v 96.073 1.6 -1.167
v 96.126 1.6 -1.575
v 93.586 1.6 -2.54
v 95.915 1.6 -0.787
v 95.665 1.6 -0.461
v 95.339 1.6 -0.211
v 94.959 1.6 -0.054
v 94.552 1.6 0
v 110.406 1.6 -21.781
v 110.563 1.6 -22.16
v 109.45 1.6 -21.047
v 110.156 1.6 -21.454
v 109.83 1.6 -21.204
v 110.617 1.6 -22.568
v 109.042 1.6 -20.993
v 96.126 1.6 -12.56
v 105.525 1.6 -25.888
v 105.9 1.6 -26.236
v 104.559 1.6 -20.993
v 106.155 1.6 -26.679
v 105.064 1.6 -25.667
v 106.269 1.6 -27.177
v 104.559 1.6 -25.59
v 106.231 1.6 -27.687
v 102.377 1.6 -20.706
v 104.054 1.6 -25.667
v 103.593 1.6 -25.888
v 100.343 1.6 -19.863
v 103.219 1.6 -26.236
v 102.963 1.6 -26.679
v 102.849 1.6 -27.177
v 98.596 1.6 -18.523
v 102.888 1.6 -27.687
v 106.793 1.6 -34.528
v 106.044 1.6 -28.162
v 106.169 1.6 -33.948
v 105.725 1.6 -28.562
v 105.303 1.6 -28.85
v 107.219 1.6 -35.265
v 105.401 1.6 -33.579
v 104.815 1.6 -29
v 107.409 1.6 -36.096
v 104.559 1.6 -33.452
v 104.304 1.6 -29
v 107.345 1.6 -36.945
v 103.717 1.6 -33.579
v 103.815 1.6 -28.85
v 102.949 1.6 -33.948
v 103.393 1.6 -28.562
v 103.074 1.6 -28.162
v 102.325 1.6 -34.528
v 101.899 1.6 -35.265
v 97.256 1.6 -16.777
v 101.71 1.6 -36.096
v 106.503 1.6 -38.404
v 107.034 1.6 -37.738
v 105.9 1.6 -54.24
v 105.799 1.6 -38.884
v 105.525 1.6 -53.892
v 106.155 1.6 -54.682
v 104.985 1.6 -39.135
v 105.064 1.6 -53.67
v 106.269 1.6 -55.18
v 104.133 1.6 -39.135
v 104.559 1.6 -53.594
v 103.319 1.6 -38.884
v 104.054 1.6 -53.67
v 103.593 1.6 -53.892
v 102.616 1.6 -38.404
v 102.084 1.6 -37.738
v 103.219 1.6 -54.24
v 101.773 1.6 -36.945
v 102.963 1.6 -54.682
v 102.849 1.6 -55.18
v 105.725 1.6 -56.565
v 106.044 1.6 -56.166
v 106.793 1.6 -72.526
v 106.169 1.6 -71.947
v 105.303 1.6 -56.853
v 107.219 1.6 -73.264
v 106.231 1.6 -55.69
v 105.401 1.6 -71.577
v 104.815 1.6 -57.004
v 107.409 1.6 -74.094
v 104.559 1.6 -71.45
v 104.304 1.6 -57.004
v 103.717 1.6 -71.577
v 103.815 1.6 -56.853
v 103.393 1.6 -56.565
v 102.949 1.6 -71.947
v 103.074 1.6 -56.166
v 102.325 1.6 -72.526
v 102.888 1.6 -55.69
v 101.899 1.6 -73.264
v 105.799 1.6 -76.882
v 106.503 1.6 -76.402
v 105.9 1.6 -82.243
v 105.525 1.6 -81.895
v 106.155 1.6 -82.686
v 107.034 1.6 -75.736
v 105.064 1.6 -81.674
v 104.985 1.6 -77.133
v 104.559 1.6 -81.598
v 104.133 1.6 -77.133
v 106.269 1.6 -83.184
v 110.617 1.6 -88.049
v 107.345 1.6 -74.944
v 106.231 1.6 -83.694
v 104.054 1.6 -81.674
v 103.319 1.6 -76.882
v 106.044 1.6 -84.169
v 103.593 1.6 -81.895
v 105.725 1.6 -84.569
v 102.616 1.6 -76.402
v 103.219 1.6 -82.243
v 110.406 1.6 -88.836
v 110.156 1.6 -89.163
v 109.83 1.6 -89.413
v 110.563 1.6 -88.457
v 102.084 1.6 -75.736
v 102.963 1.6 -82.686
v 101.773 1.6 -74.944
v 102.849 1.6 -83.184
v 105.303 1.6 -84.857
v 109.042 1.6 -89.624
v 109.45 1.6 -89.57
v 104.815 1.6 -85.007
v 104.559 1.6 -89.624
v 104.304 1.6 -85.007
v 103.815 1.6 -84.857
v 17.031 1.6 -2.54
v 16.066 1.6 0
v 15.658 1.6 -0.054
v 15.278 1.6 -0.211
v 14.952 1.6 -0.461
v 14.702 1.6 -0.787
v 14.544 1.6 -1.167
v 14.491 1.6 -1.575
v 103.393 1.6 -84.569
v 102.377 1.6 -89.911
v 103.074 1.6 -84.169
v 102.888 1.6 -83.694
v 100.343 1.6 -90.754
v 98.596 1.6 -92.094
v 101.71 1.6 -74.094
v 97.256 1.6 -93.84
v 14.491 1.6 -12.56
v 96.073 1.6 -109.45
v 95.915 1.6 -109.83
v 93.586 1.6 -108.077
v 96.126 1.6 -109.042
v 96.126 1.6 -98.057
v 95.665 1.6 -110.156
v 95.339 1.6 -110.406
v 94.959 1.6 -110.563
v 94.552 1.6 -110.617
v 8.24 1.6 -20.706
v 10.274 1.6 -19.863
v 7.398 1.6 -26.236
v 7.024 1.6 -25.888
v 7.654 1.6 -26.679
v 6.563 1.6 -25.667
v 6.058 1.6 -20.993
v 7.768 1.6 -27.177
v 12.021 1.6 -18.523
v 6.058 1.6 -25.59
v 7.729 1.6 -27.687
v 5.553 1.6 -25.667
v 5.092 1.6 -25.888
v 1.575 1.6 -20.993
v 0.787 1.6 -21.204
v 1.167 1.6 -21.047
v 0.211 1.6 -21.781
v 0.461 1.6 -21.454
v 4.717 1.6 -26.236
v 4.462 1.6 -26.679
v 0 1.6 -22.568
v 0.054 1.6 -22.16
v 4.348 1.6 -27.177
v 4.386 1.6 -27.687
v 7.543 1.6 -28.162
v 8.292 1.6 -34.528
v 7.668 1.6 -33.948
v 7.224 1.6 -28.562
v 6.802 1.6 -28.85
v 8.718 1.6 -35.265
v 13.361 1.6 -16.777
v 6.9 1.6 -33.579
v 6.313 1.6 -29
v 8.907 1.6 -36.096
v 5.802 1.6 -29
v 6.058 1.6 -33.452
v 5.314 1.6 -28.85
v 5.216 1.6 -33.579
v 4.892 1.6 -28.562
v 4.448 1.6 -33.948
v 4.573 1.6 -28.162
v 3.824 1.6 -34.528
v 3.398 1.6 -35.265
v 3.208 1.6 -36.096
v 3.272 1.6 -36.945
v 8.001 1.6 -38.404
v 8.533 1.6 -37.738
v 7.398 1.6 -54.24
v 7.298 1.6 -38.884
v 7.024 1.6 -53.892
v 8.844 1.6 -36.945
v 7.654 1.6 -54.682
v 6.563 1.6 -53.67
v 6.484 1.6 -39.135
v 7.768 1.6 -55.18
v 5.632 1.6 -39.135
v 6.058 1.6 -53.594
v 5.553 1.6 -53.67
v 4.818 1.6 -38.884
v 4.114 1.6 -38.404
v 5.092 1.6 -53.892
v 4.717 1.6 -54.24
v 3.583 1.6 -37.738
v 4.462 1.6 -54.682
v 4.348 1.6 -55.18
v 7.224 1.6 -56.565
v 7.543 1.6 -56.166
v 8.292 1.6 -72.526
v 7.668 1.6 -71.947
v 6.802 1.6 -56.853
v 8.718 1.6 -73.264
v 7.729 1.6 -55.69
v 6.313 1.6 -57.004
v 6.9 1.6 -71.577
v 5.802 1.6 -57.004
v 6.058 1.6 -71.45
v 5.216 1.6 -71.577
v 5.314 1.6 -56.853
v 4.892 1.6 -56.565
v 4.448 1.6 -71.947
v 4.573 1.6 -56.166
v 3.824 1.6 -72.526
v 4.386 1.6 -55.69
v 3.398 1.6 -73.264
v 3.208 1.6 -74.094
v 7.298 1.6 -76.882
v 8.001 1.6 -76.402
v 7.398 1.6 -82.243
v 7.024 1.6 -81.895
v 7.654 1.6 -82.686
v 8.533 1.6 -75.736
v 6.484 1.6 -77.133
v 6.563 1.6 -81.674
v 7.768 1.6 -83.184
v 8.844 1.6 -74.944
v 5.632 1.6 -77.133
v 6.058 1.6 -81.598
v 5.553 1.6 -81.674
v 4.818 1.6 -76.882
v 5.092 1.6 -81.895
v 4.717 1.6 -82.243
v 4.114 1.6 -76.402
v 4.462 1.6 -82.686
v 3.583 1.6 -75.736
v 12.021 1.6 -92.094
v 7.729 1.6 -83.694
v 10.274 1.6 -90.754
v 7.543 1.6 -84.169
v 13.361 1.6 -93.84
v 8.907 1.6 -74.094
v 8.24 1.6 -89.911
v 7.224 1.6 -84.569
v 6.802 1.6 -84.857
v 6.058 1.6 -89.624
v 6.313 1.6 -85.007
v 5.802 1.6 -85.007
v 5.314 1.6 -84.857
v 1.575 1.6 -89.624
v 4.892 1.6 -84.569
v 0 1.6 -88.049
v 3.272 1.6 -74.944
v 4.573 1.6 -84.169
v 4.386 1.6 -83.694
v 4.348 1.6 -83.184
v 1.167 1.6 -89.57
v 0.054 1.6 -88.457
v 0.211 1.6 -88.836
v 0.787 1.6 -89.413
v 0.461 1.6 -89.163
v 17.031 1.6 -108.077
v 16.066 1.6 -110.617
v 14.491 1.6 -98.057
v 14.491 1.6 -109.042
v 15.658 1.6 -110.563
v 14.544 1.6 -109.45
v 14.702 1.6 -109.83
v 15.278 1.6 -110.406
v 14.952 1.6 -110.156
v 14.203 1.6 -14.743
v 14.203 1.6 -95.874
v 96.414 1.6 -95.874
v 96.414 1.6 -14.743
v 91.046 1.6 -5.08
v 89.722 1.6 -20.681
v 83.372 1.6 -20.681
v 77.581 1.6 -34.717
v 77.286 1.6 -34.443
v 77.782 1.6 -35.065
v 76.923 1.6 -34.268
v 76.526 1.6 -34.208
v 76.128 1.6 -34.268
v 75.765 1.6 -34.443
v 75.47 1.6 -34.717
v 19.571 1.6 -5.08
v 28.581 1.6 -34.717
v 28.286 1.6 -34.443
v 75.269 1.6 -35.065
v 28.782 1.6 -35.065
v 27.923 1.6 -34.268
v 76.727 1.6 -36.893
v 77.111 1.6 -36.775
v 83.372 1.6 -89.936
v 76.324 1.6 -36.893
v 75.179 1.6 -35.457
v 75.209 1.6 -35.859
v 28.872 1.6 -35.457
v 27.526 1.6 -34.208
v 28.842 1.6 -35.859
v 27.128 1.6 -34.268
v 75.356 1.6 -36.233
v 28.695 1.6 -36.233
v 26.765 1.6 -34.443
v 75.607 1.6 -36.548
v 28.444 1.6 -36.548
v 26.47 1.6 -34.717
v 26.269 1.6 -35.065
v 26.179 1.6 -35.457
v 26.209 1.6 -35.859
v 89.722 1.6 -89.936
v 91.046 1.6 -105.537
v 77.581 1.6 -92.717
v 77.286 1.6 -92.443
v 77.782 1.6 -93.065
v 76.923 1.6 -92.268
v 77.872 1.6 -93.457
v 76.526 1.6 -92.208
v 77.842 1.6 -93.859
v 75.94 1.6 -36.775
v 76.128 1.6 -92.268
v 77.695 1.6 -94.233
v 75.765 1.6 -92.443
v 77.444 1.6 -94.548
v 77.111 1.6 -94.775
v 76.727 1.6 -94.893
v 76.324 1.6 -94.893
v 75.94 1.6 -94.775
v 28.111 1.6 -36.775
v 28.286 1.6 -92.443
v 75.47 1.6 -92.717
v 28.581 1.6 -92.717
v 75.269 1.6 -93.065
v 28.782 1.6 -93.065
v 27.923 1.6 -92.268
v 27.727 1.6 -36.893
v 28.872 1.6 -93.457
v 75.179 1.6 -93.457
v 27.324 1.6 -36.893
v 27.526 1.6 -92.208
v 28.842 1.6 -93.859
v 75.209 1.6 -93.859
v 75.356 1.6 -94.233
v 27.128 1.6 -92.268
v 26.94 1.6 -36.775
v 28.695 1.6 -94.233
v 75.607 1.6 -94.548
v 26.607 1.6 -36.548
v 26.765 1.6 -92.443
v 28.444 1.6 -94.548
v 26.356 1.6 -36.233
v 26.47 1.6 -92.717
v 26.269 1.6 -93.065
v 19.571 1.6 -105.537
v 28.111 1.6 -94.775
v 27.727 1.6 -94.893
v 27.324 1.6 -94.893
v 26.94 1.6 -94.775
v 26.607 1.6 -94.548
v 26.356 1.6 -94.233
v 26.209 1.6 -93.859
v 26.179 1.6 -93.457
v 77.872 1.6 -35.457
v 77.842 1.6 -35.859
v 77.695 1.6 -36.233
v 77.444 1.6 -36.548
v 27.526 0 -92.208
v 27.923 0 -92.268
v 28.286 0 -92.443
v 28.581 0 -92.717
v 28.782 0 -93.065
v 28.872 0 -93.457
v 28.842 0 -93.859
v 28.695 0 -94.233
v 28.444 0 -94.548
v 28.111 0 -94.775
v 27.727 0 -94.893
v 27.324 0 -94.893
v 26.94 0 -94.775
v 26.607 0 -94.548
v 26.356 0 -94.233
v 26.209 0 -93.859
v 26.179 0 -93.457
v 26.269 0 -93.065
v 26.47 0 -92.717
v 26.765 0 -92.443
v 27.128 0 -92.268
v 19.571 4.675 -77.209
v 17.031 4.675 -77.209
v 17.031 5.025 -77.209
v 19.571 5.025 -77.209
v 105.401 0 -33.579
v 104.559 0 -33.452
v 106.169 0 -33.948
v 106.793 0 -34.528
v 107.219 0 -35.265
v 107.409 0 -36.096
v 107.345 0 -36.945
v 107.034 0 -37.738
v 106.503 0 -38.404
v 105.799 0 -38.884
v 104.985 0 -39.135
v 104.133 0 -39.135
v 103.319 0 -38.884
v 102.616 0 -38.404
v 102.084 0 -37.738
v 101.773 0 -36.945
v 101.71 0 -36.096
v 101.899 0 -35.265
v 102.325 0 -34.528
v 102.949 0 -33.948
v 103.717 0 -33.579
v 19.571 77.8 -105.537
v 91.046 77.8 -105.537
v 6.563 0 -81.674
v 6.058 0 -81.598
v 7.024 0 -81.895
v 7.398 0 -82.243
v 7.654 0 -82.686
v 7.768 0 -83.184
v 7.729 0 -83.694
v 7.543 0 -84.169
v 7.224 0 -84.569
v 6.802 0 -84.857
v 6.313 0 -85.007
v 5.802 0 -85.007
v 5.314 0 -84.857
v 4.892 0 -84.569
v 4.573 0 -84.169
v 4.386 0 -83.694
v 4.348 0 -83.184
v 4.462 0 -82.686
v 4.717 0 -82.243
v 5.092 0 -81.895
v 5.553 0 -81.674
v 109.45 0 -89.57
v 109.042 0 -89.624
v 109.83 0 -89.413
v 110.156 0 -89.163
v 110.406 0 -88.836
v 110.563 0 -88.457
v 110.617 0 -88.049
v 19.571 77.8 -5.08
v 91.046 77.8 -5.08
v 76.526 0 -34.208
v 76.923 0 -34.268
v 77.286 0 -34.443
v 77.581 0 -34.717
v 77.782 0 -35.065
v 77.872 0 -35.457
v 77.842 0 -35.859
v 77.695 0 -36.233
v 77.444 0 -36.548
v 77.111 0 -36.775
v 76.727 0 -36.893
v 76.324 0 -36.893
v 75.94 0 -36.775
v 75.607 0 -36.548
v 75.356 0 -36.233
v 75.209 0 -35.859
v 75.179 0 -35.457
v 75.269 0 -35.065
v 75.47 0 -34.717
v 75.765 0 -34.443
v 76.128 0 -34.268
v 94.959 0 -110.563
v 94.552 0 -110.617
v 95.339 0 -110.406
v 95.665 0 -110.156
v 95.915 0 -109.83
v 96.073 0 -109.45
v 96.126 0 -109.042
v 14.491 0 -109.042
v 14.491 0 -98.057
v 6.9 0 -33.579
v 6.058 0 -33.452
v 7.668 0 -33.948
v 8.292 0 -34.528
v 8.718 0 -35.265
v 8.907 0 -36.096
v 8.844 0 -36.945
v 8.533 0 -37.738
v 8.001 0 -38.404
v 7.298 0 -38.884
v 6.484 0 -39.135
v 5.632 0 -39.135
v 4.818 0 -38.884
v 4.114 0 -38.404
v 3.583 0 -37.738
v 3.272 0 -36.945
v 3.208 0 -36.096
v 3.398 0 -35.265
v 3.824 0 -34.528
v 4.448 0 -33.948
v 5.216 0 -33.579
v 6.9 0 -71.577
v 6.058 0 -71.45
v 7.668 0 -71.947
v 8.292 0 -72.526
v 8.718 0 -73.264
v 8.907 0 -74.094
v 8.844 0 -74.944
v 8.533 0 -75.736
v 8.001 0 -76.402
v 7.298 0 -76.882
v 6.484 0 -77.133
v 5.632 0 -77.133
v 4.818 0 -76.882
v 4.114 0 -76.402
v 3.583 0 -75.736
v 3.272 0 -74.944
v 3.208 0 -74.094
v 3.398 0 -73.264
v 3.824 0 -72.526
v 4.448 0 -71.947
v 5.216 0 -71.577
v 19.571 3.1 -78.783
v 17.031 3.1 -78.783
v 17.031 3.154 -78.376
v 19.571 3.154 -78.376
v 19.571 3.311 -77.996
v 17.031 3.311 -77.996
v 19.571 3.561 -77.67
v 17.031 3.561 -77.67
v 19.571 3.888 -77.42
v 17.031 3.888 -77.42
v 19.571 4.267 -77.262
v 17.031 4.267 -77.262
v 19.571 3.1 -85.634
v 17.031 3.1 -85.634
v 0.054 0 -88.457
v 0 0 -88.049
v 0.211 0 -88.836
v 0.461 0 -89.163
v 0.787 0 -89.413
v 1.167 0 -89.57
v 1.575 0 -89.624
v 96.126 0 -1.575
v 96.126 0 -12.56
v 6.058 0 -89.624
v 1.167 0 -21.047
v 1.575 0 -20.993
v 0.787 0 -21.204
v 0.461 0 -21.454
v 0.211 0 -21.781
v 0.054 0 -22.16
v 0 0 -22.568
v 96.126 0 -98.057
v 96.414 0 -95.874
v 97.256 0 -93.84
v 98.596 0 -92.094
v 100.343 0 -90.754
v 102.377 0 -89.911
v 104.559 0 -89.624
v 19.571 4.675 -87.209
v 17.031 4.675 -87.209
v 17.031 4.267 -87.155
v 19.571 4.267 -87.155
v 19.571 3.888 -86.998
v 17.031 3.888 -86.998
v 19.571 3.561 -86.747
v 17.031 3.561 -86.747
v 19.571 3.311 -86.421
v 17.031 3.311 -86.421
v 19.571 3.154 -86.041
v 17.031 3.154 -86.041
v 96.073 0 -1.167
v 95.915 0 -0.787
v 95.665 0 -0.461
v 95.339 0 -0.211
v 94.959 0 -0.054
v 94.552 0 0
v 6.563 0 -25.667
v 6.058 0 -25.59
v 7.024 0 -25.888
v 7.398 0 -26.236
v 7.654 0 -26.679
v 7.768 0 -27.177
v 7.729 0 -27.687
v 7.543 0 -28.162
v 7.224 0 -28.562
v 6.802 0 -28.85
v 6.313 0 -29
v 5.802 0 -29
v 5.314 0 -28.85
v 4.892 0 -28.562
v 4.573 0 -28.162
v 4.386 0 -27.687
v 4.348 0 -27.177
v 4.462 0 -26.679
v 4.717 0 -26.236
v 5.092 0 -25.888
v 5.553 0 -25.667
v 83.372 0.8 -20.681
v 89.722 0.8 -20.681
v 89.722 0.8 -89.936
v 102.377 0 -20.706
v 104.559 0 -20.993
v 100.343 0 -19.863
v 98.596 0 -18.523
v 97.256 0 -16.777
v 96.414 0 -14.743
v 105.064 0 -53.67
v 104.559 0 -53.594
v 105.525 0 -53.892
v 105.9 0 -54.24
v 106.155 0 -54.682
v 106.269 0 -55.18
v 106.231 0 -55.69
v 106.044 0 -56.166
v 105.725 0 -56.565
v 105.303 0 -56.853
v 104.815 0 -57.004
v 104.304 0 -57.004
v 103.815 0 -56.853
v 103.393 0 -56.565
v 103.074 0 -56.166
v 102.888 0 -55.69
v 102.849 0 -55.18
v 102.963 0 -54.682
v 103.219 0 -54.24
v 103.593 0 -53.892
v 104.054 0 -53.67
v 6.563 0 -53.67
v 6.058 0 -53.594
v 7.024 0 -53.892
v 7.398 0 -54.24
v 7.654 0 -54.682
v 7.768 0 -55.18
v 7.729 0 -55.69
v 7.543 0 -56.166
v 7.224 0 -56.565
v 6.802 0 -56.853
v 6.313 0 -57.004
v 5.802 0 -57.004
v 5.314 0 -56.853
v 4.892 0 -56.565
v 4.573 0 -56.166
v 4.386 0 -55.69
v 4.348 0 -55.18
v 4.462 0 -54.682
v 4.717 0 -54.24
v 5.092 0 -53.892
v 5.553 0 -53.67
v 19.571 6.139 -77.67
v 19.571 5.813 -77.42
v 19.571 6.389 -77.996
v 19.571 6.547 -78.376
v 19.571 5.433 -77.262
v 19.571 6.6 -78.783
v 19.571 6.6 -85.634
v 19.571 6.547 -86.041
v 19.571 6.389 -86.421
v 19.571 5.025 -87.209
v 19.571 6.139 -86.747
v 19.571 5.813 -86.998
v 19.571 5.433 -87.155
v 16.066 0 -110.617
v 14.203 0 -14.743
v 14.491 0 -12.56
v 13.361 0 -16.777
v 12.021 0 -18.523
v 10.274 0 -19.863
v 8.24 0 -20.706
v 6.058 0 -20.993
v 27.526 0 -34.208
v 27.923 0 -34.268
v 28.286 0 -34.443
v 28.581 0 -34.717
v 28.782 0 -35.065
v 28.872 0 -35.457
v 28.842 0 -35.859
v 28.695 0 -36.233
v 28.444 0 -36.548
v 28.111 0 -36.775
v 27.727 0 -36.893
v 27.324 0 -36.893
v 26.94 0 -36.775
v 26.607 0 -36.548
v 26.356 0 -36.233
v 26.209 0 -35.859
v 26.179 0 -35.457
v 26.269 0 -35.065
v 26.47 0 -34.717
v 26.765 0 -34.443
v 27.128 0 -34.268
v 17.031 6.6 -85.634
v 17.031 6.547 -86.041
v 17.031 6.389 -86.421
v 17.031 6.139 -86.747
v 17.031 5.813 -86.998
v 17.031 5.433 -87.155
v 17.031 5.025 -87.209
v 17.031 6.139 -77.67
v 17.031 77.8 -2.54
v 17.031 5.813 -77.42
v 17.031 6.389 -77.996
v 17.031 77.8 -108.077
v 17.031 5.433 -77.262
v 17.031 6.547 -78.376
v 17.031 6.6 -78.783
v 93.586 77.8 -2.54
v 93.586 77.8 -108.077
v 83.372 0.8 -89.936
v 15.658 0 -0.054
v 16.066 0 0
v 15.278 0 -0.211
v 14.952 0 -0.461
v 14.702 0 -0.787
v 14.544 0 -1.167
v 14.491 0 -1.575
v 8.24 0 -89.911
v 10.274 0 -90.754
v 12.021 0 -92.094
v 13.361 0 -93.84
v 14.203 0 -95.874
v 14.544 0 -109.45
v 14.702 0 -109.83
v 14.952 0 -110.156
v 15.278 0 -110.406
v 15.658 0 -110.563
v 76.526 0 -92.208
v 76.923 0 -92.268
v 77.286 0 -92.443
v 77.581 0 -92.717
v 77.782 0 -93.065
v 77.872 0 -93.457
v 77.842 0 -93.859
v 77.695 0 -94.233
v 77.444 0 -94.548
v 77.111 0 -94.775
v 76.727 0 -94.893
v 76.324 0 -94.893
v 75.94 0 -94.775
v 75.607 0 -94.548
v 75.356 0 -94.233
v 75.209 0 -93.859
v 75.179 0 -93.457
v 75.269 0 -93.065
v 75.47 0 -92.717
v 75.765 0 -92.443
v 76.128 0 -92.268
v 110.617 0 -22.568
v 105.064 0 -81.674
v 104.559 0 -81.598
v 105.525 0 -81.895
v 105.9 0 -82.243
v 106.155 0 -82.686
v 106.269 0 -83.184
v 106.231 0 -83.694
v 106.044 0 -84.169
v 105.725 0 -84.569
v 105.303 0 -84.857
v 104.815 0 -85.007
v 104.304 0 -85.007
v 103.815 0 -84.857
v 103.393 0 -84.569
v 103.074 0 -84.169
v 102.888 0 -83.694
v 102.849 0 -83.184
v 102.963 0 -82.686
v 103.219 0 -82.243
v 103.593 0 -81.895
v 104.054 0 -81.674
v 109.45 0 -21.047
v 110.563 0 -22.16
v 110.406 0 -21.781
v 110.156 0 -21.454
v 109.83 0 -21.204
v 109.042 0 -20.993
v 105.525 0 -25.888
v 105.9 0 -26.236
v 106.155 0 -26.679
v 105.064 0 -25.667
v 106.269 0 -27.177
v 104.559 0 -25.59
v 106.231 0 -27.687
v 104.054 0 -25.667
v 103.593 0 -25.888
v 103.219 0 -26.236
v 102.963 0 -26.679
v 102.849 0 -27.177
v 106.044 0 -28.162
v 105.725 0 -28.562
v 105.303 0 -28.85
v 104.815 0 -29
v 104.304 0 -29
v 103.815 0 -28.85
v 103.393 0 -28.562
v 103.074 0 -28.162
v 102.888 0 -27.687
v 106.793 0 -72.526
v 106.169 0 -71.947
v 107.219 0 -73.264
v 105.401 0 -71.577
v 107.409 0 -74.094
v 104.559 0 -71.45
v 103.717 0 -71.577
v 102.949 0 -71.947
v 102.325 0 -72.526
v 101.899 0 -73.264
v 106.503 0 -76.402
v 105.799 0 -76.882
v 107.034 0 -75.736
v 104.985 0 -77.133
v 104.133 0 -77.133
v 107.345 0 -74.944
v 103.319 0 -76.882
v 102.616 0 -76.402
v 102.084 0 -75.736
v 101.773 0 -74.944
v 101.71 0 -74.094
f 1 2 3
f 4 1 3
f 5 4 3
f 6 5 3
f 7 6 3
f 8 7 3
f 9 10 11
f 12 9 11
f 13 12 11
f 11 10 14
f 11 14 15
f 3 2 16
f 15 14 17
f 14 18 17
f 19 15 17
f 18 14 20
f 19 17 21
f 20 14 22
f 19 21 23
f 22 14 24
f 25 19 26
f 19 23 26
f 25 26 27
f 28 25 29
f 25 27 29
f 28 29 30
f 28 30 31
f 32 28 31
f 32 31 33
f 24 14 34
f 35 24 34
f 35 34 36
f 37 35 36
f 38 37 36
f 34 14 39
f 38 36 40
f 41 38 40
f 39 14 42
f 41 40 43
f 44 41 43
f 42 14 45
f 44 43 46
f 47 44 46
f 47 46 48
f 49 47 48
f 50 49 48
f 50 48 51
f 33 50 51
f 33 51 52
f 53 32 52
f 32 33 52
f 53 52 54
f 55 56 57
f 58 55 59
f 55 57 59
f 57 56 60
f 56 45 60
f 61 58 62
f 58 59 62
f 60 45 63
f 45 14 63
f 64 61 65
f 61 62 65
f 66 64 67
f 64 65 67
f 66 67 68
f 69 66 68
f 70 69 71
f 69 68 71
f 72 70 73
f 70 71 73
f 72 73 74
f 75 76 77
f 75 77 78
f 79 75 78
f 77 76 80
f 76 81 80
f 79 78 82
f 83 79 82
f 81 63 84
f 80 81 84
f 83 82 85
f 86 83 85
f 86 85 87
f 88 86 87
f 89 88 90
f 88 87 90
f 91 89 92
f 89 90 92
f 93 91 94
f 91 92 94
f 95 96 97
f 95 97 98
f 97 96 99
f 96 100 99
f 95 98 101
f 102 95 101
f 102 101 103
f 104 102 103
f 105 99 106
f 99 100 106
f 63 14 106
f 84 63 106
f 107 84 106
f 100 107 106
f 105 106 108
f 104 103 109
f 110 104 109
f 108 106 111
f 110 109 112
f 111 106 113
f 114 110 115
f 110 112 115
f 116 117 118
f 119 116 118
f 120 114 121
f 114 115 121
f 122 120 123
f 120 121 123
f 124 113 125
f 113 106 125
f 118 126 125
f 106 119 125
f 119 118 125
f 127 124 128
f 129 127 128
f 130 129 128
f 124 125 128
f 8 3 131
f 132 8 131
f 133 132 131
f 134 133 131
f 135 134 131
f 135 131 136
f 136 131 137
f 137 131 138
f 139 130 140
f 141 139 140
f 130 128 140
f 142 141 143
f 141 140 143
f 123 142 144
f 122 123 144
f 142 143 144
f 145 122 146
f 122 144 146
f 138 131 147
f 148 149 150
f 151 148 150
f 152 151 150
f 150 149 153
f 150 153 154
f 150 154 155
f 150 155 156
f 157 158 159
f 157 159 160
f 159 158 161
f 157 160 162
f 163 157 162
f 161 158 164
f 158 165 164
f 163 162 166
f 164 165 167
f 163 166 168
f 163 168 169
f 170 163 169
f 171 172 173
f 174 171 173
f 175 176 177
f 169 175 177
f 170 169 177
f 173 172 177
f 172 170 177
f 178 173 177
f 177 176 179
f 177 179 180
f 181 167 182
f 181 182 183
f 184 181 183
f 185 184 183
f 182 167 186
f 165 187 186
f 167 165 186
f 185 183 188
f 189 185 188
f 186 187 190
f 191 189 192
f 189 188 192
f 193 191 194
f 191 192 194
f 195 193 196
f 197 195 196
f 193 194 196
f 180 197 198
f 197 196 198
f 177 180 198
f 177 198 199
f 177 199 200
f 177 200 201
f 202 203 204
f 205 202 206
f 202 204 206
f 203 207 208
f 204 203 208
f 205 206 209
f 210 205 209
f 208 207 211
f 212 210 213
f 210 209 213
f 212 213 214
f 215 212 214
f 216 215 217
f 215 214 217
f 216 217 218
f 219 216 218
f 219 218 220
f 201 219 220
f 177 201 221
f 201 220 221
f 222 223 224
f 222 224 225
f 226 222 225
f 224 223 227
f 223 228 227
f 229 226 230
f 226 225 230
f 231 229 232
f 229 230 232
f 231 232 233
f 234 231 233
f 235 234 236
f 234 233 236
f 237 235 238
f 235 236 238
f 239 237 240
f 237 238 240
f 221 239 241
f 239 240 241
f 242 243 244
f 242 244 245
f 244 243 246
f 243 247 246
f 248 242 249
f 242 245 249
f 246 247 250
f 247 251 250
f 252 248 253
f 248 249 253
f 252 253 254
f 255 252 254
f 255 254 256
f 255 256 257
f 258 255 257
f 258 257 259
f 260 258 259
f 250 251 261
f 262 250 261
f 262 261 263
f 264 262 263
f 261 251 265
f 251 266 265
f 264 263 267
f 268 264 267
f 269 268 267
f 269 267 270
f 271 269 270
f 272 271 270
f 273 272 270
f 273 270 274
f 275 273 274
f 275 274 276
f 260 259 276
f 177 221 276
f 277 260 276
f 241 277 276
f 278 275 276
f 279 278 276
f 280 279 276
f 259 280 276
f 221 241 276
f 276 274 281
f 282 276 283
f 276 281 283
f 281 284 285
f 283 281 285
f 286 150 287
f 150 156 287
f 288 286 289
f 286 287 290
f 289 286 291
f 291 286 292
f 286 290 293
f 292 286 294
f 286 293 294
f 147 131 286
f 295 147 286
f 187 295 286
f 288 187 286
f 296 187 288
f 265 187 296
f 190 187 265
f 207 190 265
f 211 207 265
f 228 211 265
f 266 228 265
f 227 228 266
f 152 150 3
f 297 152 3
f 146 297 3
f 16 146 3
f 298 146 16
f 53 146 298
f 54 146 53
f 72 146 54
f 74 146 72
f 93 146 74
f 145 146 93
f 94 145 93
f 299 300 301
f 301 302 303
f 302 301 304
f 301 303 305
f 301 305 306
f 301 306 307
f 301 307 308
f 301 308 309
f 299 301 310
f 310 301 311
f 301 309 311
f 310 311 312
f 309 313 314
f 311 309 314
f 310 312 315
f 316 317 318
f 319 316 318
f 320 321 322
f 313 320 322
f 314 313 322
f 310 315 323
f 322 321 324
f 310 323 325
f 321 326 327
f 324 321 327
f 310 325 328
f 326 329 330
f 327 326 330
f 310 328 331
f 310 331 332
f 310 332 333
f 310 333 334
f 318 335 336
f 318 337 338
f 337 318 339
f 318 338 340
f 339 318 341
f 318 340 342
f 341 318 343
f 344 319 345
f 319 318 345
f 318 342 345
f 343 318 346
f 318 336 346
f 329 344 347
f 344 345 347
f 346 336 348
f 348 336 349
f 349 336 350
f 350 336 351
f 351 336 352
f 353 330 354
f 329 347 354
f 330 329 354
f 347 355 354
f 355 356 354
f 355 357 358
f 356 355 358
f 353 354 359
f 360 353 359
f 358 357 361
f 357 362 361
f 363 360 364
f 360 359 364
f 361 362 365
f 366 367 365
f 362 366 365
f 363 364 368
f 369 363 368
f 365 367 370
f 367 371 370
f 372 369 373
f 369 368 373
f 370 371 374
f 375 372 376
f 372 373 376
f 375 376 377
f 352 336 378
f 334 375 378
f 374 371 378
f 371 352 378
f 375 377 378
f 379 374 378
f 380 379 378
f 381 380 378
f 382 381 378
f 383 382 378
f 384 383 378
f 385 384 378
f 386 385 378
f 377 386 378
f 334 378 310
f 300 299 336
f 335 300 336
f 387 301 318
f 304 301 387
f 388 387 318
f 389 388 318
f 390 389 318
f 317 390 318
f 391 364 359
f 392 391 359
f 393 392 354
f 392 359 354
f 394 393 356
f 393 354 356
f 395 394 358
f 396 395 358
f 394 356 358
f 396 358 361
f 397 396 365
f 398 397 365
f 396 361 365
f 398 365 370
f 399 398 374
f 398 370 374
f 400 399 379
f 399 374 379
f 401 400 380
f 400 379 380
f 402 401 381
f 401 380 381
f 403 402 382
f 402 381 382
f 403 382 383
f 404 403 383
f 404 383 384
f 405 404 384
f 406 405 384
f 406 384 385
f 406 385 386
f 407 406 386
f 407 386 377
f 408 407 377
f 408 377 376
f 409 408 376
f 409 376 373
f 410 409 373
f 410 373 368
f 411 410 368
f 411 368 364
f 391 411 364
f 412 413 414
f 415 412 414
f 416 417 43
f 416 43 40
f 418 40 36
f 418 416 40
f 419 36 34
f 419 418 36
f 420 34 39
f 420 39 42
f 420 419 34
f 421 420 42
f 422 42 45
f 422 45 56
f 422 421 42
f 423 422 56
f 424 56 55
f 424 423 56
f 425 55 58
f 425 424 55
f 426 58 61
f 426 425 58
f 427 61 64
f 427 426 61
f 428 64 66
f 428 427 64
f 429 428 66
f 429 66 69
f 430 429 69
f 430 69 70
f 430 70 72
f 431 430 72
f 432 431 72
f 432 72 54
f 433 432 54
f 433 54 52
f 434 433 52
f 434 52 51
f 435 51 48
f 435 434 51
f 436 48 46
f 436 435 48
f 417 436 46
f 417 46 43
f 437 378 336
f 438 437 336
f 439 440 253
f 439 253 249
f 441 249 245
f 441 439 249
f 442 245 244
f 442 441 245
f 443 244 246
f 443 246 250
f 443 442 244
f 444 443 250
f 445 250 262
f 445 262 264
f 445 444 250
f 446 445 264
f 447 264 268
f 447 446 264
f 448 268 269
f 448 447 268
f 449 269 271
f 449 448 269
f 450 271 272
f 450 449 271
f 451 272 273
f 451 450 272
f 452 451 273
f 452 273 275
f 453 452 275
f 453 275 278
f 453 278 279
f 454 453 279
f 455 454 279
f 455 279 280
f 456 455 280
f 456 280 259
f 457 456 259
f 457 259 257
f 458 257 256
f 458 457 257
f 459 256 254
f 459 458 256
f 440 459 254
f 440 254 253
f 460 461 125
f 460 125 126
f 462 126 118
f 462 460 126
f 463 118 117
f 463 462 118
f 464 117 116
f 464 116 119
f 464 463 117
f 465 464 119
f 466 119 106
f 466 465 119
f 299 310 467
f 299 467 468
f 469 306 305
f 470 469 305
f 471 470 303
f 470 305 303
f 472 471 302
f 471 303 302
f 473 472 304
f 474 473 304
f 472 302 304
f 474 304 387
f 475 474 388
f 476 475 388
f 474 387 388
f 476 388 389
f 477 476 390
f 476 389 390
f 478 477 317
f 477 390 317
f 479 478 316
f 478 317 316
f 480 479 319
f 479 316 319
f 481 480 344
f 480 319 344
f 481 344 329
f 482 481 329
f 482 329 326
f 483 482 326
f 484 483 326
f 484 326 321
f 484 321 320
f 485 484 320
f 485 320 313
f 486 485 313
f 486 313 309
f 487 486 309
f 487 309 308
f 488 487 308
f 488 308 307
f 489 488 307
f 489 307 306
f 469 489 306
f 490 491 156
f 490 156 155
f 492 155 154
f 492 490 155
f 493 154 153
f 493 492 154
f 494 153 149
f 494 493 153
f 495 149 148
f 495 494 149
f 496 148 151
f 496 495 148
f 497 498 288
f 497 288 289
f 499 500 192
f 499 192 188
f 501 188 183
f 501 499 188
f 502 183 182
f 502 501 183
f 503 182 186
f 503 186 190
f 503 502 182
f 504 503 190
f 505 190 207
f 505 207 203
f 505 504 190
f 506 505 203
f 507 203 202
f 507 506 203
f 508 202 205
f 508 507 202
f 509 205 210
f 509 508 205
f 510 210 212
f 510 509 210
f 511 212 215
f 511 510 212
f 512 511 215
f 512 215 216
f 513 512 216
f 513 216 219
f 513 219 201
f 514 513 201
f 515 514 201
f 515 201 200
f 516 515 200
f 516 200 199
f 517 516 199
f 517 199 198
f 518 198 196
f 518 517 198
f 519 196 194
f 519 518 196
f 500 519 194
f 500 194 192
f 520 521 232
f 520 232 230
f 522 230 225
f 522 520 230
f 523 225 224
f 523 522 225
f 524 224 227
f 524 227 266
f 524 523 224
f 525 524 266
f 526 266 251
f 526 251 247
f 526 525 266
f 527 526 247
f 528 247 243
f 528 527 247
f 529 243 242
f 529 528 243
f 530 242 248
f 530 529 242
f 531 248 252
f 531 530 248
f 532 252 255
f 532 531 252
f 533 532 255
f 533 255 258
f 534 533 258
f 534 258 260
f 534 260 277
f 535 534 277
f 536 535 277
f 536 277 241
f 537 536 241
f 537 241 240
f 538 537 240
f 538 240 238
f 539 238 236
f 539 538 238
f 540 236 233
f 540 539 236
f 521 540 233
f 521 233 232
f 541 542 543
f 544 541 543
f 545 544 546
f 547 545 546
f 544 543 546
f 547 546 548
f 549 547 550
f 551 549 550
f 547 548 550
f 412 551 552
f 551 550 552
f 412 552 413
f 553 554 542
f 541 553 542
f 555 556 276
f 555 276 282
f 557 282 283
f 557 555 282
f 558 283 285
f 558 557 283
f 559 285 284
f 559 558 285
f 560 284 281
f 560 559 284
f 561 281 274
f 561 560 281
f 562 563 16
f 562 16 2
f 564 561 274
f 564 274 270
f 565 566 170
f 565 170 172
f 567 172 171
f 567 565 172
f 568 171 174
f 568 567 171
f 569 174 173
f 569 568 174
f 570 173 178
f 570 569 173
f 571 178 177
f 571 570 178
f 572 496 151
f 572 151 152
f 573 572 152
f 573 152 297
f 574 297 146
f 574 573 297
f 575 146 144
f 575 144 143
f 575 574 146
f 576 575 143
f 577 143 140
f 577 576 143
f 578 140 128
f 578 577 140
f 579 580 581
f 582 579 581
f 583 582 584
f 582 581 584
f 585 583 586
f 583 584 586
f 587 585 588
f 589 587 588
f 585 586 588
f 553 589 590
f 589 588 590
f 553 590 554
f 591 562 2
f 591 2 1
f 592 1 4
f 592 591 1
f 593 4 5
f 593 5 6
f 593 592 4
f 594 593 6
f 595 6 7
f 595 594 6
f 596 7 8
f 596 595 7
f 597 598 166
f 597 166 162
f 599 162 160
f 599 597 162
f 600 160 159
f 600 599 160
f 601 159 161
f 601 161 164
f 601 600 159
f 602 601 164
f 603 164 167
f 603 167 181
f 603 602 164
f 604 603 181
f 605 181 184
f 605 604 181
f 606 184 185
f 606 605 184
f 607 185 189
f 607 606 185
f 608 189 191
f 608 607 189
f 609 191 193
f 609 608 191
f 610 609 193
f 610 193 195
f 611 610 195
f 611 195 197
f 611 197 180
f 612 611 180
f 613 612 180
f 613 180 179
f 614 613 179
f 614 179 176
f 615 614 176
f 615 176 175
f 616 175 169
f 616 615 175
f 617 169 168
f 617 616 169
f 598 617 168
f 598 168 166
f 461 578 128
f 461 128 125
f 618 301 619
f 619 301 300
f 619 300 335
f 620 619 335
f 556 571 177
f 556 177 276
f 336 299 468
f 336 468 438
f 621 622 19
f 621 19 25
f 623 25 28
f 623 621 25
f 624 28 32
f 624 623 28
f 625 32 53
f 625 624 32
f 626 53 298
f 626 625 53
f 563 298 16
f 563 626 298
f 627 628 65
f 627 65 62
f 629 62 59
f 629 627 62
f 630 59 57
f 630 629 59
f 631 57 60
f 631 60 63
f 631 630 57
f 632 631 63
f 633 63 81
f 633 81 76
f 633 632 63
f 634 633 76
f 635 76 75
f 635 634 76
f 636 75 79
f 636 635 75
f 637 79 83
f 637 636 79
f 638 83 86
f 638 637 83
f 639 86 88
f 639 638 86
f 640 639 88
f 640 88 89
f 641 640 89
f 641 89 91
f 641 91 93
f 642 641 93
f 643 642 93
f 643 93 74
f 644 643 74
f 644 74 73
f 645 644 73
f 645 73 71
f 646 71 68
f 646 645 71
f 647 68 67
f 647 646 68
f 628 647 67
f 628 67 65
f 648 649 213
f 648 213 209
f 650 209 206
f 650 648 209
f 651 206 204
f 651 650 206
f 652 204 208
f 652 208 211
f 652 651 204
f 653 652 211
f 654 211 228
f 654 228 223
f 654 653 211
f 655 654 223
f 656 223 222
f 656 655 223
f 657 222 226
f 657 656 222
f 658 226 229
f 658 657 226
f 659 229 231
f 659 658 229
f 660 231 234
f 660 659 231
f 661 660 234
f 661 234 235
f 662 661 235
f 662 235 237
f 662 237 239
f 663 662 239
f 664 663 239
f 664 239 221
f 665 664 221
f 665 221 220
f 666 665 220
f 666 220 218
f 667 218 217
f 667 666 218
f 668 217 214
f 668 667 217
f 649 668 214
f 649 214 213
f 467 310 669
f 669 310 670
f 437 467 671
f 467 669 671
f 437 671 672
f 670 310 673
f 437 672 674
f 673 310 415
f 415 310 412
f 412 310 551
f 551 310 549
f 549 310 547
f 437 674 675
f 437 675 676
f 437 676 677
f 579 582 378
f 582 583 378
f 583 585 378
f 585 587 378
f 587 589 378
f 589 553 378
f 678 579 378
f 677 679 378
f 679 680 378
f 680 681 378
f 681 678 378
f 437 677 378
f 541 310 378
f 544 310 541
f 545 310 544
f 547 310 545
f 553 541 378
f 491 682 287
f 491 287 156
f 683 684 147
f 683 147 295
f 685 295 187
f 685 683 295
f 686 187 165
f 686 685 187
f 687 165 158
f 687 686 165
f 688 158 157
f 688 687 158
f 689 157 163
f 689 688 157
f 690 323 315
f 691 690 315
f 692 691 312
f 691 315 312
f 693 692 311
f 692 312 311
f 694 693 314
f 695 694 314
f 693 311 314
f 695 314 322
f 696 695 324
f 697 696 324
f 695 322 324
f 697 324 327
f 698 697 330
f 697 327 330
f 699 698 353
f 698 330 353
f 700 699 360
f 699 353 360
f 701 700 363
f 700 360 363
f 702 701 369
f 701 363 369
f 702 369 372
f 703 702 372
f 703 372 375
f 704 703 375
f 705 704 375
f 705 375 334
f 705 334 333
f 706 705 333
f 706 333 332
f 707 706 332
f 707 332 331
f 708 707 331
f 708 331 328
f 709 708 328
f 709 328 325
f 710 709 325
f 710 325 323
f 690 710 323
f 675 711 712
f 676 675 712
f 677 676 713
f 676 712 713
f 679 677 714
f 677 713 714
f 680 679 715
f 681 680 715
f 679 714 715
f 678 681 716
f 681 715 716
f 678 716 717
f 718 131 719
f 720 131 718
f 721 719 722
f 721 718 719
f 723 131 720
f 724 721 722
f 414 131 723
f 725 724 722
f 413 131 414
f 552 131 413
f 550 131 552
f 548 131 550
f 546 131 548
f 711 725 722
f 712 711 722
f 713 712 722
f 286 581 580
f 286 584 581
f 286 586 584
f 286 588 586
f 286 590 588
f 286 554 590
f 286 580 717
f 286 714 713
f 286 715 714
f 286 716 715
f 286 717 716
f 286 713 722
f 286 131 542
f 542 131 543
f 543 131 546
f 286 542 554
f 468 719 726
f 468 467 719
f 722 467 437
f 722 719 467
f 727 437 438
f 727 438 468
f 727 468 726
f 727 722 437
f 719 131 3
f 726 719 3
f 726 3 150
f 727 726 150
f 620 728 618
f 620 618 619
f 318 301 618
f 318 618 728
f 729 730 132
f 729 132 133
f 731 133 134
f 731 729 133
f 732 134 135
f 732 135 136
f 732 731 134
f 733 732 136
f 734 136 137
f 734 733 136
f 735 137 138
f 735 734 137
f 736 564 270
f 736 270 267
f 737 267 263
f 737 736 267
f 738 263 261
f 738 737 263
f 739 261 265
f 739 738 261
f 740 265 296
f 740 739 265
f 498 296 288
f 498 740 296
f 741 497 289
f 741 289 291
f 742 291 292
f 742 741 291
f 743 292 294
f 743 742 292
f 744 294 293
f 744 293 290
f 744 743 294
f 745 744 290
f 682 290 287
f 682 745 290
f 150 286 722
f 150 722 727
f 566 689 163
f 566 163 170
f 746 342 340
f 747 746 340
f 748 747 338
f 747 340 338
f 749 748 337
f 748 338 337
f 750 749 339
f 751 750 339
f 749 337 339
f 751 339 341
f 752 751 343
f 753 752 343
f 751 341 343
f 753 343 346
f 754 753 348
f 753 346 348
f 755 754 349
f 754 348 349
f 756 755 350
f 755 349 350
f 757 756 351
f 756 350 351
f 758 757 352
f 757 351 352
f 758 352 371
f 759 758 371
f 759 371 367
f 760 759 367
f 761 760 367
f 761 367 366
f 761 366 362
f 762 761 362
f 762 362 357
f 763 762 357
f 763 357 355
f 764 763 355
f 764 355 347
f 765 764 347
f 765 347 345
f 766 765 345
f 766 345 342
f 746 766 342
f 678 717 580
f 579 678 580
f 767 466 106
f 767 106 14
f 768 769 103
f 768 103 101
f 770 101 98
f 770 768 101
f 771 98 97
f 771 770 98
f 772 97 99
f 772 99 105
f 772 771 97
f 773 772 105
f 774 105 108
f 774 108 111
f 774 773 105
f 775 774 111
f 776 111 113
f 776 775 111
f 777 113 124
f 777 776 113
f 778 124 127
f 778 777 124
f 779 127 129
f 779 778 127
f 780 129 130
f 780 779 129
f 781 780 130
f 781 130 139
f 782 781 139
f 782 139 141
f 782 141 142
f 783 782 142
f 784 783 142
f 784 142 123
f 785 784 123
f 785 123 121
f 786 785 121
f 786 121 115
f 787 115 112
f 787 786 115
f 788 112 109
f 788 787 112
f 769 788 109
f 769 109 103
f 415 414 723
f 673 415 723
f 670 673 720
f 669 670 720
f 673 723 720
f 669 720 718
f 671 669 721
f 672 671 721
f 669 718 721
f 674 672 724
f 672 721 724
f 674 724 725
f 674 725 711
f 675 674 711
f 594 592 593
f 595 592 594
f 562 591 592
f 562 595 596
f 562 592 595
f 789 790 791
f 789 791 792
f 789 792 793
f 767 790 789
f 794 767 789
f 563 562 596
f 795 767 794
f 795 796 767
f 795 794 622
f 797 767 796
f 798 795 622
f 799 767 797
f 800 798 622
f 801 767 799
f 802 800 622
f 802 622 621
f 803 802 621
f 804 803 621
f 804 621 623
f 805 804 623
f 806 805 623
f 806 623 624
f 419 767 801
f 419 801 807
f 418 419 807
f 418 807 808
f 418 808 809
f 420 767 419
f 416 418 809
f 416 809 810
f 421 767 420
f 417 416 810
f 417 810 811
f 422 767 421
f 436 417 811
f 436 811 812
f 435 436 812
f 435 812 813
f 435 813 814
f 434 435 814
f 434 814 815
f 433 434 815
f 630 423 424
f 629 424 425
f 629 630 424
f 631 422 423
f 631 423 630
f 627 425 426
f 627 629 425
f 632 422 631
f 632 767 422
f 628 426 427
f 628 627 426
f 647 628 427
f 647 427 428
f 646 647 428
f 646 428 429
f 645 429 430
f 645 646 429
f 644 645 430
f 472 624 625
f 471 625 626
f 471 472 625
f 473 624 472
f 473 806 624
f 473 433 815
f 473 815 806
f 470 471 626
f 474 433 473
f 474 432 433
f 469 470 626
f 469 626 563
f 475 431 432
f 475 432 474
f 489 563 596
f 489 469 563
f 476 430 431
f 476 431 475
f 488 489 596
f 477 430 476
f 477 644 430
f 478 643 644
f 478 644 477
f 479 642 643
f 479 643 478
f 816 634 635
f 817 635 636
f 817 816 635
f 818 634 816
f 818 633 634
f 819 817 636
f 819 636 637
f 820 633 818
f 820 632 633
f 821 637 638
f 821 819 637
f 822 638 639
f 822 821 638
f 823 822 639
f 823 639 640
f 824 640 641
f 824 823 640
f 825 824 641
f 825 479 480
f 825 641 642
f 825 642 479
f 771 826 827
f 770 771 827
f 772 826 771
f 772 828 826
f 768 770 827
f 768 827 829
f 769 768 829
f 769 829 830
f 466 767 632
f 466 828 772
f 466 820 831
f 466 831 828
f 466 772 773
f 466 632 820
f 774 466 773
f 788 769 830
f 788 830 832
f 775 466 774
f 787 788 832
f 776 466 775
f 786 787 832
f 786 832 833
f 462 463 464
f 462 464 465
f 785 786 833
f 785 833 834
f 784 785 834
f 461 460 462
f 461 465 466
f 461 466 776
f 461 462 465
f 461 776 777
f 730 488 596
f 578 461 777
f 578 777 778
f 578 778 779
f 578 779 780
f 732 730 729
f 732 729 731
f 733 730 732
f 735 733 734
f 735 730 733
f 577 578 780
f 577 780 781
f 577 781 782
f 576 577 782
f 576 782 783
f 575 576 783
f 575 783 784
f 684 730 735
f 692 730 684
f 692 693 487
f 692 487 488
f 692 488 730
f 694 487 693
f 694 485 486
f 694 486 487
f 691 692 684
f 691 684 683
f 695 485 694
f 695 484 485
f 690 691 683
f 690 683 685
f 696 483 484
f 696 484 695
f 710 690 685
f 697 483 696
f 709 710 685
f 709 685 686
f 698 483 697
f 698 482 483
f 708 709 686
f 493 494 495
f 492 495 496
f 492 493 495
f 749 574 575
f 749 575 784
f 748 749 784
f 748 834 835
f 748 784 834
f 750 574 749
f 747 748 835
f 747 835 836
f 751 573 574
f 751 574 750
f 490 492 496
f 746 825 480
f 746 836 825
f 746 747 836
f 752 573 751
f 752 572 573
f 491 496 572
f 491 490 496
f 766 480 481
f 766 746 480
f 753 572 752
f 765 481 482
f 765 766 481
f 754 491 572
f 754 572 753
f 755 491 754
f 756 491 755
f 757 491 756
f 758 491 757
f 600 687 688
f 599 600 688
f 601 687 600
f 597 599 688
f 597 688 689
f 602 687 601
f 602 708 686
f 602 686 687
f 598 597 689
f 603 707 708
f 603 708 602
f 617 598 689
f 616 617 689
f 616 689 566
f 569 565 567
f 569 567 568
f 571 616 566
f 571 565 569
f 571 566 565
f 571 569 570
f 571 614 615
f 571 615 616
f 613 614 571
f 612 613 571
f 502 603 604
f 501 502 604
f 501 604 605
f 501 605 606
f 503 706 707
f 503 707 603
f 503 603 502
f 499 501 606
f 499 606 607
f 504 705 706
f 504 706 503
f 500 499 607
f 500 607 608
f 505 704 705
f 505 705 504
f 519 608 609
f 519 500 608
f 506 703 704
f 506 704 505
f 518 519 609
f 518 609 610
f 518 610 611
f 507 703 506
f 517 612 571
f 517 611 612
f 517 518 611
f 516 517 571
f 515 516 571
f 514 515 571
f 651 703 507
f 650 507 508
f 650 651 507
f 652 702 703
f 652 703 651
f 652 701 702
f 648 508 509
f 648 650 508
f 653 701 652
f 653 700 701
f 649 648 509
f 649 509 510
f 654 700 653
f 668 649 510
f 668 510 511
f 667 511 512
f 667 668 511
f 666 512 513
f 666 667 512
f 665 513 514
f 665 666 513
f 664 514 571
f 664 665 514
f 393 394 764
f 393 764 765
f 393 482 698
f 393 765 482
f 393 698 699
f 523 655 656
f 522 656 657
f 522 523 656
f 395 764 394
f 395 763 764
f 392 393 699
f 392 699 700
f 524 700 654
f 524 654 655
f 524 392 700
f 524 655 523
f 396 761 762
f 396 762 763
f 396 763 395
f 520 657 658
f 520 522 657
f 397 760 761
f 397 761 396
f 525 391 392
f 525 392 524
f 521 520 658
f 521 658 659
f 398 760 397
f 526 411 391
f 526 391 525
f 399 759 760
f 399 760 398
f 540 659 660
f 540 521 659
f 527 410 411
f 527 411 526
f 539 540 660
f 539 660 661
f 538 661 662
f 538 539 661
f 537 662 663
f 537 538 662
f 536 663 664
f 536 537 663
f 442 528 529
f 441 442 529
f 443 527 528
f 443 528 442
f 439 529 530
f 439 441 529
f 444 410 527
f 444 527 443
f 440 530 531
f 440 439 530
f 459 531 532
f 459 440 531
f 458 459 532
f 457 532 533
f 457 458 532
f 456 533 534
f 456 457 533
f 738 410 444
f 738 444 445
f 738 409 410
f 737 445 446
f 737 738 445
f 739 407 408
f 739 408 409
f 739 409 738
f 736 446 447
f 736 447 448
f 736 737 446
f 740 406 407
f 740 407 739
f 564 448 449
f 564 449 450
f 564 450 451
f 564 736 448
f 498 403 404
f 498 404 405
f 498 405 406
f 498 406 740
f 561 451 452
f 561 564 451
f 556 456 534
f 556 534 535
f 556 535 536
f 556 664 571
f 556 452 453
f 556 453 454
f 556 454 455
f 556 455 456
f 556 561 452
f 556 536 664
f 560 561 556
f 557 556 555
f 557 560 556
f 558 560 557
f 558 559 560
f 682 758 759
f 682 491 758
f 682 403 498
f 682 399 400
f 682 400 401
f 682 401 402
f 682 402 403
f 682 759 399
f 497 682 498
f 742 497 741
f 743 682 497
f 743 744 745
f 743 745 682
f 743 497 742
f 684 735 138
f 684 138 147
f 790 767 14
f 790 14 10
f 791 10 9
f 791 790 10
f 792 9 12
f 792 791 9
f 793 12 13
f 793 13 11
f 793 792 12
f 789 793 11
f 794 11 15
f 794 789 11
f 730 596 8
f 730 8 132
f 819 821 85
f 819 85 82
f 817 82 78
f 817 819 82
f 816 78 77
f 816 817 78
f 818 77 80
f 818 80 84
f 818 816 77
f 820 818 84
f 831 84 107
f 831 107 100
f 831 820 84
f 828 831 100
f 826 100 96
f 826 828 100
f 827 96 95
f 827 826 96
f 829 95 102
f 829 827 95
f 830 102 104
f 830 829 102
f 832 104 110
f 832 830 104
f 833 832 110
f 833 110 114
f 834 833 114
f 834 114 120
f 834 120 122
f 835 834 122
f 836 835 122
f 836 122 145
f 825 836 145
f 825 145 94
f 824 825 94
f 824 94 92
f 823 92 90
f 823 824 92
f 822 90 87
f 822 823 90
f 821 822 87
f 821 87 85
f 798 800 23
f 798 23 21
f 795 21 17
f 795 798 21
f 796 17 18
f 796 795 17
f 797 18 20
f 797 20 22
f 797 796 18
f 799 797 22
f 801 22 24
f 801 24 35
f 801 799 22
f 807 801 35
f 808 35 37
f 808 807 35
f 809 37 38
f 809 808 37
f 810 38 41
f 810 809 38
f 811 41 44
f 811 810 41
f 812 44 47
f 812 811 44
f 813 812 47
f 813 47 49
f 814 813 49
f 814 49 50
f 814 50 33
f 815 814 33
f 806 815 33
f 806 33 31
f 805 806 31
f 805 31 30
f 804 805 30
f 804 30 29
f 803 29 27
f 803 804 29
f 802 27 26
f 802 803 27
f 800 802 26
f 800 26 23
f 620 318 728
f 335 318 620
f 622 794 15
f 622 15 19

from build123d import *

# Parameters (mm, degrees)
SKETCH1_R              = 1.7145
SKETCH1_R_2            = 2.8575
BASE_DEPTH             = 1.6002
SKETCH3_W              = 6.35
SKETCH3_H              = 69.255343758
BREADBOARD_SLICE_DEPTH = 0.8001
RPI_HOLES_SIZING_R     = 1.35
RPI_HOLES_DEPTH        = 157.444245717
WALL_BASE_W            = 76.5556
WALL_BASE_H            = 105.537
WALL_BASE_W_2          = 71.4756
WALL_BASE_H_2          = 100.457
WALL_DEPTH             = 76.2
USBC_DEPTH             = 2.54


with BuildPart() as part:
    # Sketch1 → Base (new body)
    with BuildSketch(Plane(origin=(0, 0, 0), x_dir=(1, 0, 0), z_dir=(0, 1, 0))):
        with BuildLine():
            Line((0, 22.5679), (0, 88.0491))
            ThreePointArc((0, 88.0491), (0.461248241, 89.162651759), (1.5748, 89.6239))
            Line((1.5748, 89.6239), (6.0579, 89.6239))
            ThreePointArc((6.0579, 89.6239), (12.020790064, 92.093809936), (14.4907, 98.0567))
            Line((14.4907, 98.0567), (14.4907, 109.0422))
            ThreePointArc((14.4907, 109.0422), (14.951948241, 110.155751759), (16.0655, 110.617))
            Line((16.0655, 110.617), (94.5515, 110.617))
            ThreePointArc((94.5515, 110.617), (95.665051759, 110.155751759), (96.1263, 109.0422))
            Line((96.1263, 109.0422), (96.1263, 98.0567))
            ThreePointArc((96.1263, 98.0567), (98.596209936, 92.093809936), (104.5591, 89.6239))
            Line((104.5591, 89.6239), (109.0422, 89.6239))
            ThreePointArc((109.0422, 89.6239), (110.155751759, 89.162651759), (110.617, 88.0491))
            Line((110.617, 88.0491), (110.617, 22.5679))
            ThreePointArc((110.617, 22.5679), (110.155751759, 21.454348241), (109.0422, 20.9931))
            Line((109.0422, 20.9931), (104.5591, 20.9931))
            ThreePointArc((104.5591, 20.9931), (98.596209936, 18.523190064), (96.1263, 12.5603))
            Line((96.1263, 12.5603), (96.1263, 1.5748))
            ThreePointArc((96.1263, 1.5748), (95.665051759, 0.461248241), (94.5515, 0))
            Line((94.5515, 0), (16.0655, 0))
            ThreePointArc((16.0655, 0), (14.951948241, 0.461248241), (14.4907, 1.5748))
            Line((14.4907, 1.5748), (14.4907, 12.5603))
            ThreePointArc((14.4907, 12.5603), (12.020790064, 18.523190064), (6.0579, 20.9931))
            Line((6.0579, 20.9931), (1.5748, 20.9931))
            ThreePointArc((1.5748, 20.9931), (0.461248241, 21.454348241), (0, 22.5679))
        make_face()
        with Locations(Location((6.0579, 83.312, 0), (0, 0, 270))):
            Circle(SKETCH1_R, mode=Mode.SUBTRACT)
        with Locations(Location((6.0579, 27.305, 0), (0, 0, 270))):
            Circle(SKETCH1_R, mode=Mode.SUBTRACT)
        with Locations(Location((6.0579, 55.3085, 0), (0, 0, 270))):
            Circle(SKETCH1_R, mode=Mode.SUBTRACT)
        with Locations(Location((104.5591, 83.312, 0), (0, 0, 270))):
            Circle(SKETCH1_R, mode=Mode.SUBTRACT)
        with Locations(Location((104.5591, 55.3085, 0), (0, 0, 270))):
            Circle(SKETCH1_R, mode=Mode.SUBTRACT)
        with Locations(Location((104.5591, 27.305, 0), (0, 0, 270))):
            Circle(SKETCH1_R, mode=Mode.SUBTRACT)
        with Locations(Location((6.0579, 74.3077, 0), (0, 0, 270))):
            Circle(SKETCH1_R_2, mode=Mode.SUBTRACT)
        with Locations(Location((104.5591, 74.3077, 0), (0, 0, 270))):
            Circle(SKETCH1_R_2, mode=Mode.SUBTRACT)
        with Locations(Location((104.5591, 36.3093, 0), (0, 0, 270))):
            Circle(SKETCH1_R_2, mode=Mode.SUBTRACT)
        with Locations(Location((6.0579, 36.3093, 0), (0, 0, 270))):
            Circle(SKETCH1_R_2, mode=Mode.SUBTRACT)
    extrude(amount=BASE_DEPTH)

    # Sketch3 → Breadboard Slice (cut)
    with BuildSketch(Plane(origin=(0, 1.6002, 0), x_dir=(1, 0, 0), z_dir=(0, 1, 0))):
        with Locations((86.546861599, 55.3085)):
            Rectangle(SKETCH3_W, SKETCH3_H)
    extrude(amount=-BREADBOARD_SLICE_DEPTH, mode=Mode.SUBTRACT)

    # RPi Holes + Sizing → RPi Holes (cut, through all)
    with BuildSketch(Plane(origin=(0, 1.6002, 0), x_dir=(1, 0, 0), z_dir=(0, 1, 0))):
        with Locations(Location((27.525509773, 93.558267586, 0), (0, 0, 270))):
            Circle(RPI_HOLES_SIZING_R)
        with Locations(Location((76.525509773, 93.558267586, 0), (0, 0, 270))):
            Circle(RPI_HOLES_SIZING_R)
        with Locations(Location((27.525509773, 35.558267586, 0), (0, 0, 270))):
            Circle(RPI_HOLES_SIZING_R)
        with Locations(Location((76.525509773, 35.558267586, 0), (0, 0, 270))):
            Circle(RPI_HOLES_SIZING_R)
    extrude(amount=-RPI_HOLES_DEPTH, mode=Mode.SUBTRACT)

    # Wall Base → Wall (add)
    with BuildSketch(Plane(origin=(0, 1.6002, 0), x_dir=(1, 0, 0), z_dir=(0, 1, 0))):
        with Locations((55.3085, 55.3085)):
            Rectangle(WALL_BASE_W, WALL_BASE_H)
        with Locations((55.3085, 55.3085)):
            Rectangle(WALL_BASE_W_2, WALL_BASE_H_2, mode=Mode.SUBTRACT)
    extrude(amount=WALL_DEPTH)

    # Sketch6 → USBC (cut)
    with BuildSketch(Plane.ZY.offset(-17.0307)):
        with BuildLine():
            Line((-85.633722135, 3.1002), (-78.783322135, 3.1002))
            ThreePointArc((-78.783322135, 3.1002), (-77.669770376, 3.561448241), (-77.208522135, 4.675))
            Line((-77.208522135, 4.675), (-77.208522135, 5.0254))
            ThreePointArc((-77.208522135, 5.0254), (-77.669770376, 6.138951759), (-78.783322135, 6.6002))
            Line((-78.783322135, 6.6002), (-85.633722135, 6.6002))
            ThreePointArc((-85.633722135, 6.6002), (-86.747273894, 6.138951759), (-87.208522135, 5.0254))
            Line((-87.208522135, 5.0254), (-87.208522135, 4.675))
            ThreePointArc((-87.208522135, 4.675), (-86.747273894, 3.561448241), (-85.633722135, 3.1002))
        make_face()
    extrude(amount=-USBC_DEPTH, mode=Mode.SUBTRACT)


solid = part.part
